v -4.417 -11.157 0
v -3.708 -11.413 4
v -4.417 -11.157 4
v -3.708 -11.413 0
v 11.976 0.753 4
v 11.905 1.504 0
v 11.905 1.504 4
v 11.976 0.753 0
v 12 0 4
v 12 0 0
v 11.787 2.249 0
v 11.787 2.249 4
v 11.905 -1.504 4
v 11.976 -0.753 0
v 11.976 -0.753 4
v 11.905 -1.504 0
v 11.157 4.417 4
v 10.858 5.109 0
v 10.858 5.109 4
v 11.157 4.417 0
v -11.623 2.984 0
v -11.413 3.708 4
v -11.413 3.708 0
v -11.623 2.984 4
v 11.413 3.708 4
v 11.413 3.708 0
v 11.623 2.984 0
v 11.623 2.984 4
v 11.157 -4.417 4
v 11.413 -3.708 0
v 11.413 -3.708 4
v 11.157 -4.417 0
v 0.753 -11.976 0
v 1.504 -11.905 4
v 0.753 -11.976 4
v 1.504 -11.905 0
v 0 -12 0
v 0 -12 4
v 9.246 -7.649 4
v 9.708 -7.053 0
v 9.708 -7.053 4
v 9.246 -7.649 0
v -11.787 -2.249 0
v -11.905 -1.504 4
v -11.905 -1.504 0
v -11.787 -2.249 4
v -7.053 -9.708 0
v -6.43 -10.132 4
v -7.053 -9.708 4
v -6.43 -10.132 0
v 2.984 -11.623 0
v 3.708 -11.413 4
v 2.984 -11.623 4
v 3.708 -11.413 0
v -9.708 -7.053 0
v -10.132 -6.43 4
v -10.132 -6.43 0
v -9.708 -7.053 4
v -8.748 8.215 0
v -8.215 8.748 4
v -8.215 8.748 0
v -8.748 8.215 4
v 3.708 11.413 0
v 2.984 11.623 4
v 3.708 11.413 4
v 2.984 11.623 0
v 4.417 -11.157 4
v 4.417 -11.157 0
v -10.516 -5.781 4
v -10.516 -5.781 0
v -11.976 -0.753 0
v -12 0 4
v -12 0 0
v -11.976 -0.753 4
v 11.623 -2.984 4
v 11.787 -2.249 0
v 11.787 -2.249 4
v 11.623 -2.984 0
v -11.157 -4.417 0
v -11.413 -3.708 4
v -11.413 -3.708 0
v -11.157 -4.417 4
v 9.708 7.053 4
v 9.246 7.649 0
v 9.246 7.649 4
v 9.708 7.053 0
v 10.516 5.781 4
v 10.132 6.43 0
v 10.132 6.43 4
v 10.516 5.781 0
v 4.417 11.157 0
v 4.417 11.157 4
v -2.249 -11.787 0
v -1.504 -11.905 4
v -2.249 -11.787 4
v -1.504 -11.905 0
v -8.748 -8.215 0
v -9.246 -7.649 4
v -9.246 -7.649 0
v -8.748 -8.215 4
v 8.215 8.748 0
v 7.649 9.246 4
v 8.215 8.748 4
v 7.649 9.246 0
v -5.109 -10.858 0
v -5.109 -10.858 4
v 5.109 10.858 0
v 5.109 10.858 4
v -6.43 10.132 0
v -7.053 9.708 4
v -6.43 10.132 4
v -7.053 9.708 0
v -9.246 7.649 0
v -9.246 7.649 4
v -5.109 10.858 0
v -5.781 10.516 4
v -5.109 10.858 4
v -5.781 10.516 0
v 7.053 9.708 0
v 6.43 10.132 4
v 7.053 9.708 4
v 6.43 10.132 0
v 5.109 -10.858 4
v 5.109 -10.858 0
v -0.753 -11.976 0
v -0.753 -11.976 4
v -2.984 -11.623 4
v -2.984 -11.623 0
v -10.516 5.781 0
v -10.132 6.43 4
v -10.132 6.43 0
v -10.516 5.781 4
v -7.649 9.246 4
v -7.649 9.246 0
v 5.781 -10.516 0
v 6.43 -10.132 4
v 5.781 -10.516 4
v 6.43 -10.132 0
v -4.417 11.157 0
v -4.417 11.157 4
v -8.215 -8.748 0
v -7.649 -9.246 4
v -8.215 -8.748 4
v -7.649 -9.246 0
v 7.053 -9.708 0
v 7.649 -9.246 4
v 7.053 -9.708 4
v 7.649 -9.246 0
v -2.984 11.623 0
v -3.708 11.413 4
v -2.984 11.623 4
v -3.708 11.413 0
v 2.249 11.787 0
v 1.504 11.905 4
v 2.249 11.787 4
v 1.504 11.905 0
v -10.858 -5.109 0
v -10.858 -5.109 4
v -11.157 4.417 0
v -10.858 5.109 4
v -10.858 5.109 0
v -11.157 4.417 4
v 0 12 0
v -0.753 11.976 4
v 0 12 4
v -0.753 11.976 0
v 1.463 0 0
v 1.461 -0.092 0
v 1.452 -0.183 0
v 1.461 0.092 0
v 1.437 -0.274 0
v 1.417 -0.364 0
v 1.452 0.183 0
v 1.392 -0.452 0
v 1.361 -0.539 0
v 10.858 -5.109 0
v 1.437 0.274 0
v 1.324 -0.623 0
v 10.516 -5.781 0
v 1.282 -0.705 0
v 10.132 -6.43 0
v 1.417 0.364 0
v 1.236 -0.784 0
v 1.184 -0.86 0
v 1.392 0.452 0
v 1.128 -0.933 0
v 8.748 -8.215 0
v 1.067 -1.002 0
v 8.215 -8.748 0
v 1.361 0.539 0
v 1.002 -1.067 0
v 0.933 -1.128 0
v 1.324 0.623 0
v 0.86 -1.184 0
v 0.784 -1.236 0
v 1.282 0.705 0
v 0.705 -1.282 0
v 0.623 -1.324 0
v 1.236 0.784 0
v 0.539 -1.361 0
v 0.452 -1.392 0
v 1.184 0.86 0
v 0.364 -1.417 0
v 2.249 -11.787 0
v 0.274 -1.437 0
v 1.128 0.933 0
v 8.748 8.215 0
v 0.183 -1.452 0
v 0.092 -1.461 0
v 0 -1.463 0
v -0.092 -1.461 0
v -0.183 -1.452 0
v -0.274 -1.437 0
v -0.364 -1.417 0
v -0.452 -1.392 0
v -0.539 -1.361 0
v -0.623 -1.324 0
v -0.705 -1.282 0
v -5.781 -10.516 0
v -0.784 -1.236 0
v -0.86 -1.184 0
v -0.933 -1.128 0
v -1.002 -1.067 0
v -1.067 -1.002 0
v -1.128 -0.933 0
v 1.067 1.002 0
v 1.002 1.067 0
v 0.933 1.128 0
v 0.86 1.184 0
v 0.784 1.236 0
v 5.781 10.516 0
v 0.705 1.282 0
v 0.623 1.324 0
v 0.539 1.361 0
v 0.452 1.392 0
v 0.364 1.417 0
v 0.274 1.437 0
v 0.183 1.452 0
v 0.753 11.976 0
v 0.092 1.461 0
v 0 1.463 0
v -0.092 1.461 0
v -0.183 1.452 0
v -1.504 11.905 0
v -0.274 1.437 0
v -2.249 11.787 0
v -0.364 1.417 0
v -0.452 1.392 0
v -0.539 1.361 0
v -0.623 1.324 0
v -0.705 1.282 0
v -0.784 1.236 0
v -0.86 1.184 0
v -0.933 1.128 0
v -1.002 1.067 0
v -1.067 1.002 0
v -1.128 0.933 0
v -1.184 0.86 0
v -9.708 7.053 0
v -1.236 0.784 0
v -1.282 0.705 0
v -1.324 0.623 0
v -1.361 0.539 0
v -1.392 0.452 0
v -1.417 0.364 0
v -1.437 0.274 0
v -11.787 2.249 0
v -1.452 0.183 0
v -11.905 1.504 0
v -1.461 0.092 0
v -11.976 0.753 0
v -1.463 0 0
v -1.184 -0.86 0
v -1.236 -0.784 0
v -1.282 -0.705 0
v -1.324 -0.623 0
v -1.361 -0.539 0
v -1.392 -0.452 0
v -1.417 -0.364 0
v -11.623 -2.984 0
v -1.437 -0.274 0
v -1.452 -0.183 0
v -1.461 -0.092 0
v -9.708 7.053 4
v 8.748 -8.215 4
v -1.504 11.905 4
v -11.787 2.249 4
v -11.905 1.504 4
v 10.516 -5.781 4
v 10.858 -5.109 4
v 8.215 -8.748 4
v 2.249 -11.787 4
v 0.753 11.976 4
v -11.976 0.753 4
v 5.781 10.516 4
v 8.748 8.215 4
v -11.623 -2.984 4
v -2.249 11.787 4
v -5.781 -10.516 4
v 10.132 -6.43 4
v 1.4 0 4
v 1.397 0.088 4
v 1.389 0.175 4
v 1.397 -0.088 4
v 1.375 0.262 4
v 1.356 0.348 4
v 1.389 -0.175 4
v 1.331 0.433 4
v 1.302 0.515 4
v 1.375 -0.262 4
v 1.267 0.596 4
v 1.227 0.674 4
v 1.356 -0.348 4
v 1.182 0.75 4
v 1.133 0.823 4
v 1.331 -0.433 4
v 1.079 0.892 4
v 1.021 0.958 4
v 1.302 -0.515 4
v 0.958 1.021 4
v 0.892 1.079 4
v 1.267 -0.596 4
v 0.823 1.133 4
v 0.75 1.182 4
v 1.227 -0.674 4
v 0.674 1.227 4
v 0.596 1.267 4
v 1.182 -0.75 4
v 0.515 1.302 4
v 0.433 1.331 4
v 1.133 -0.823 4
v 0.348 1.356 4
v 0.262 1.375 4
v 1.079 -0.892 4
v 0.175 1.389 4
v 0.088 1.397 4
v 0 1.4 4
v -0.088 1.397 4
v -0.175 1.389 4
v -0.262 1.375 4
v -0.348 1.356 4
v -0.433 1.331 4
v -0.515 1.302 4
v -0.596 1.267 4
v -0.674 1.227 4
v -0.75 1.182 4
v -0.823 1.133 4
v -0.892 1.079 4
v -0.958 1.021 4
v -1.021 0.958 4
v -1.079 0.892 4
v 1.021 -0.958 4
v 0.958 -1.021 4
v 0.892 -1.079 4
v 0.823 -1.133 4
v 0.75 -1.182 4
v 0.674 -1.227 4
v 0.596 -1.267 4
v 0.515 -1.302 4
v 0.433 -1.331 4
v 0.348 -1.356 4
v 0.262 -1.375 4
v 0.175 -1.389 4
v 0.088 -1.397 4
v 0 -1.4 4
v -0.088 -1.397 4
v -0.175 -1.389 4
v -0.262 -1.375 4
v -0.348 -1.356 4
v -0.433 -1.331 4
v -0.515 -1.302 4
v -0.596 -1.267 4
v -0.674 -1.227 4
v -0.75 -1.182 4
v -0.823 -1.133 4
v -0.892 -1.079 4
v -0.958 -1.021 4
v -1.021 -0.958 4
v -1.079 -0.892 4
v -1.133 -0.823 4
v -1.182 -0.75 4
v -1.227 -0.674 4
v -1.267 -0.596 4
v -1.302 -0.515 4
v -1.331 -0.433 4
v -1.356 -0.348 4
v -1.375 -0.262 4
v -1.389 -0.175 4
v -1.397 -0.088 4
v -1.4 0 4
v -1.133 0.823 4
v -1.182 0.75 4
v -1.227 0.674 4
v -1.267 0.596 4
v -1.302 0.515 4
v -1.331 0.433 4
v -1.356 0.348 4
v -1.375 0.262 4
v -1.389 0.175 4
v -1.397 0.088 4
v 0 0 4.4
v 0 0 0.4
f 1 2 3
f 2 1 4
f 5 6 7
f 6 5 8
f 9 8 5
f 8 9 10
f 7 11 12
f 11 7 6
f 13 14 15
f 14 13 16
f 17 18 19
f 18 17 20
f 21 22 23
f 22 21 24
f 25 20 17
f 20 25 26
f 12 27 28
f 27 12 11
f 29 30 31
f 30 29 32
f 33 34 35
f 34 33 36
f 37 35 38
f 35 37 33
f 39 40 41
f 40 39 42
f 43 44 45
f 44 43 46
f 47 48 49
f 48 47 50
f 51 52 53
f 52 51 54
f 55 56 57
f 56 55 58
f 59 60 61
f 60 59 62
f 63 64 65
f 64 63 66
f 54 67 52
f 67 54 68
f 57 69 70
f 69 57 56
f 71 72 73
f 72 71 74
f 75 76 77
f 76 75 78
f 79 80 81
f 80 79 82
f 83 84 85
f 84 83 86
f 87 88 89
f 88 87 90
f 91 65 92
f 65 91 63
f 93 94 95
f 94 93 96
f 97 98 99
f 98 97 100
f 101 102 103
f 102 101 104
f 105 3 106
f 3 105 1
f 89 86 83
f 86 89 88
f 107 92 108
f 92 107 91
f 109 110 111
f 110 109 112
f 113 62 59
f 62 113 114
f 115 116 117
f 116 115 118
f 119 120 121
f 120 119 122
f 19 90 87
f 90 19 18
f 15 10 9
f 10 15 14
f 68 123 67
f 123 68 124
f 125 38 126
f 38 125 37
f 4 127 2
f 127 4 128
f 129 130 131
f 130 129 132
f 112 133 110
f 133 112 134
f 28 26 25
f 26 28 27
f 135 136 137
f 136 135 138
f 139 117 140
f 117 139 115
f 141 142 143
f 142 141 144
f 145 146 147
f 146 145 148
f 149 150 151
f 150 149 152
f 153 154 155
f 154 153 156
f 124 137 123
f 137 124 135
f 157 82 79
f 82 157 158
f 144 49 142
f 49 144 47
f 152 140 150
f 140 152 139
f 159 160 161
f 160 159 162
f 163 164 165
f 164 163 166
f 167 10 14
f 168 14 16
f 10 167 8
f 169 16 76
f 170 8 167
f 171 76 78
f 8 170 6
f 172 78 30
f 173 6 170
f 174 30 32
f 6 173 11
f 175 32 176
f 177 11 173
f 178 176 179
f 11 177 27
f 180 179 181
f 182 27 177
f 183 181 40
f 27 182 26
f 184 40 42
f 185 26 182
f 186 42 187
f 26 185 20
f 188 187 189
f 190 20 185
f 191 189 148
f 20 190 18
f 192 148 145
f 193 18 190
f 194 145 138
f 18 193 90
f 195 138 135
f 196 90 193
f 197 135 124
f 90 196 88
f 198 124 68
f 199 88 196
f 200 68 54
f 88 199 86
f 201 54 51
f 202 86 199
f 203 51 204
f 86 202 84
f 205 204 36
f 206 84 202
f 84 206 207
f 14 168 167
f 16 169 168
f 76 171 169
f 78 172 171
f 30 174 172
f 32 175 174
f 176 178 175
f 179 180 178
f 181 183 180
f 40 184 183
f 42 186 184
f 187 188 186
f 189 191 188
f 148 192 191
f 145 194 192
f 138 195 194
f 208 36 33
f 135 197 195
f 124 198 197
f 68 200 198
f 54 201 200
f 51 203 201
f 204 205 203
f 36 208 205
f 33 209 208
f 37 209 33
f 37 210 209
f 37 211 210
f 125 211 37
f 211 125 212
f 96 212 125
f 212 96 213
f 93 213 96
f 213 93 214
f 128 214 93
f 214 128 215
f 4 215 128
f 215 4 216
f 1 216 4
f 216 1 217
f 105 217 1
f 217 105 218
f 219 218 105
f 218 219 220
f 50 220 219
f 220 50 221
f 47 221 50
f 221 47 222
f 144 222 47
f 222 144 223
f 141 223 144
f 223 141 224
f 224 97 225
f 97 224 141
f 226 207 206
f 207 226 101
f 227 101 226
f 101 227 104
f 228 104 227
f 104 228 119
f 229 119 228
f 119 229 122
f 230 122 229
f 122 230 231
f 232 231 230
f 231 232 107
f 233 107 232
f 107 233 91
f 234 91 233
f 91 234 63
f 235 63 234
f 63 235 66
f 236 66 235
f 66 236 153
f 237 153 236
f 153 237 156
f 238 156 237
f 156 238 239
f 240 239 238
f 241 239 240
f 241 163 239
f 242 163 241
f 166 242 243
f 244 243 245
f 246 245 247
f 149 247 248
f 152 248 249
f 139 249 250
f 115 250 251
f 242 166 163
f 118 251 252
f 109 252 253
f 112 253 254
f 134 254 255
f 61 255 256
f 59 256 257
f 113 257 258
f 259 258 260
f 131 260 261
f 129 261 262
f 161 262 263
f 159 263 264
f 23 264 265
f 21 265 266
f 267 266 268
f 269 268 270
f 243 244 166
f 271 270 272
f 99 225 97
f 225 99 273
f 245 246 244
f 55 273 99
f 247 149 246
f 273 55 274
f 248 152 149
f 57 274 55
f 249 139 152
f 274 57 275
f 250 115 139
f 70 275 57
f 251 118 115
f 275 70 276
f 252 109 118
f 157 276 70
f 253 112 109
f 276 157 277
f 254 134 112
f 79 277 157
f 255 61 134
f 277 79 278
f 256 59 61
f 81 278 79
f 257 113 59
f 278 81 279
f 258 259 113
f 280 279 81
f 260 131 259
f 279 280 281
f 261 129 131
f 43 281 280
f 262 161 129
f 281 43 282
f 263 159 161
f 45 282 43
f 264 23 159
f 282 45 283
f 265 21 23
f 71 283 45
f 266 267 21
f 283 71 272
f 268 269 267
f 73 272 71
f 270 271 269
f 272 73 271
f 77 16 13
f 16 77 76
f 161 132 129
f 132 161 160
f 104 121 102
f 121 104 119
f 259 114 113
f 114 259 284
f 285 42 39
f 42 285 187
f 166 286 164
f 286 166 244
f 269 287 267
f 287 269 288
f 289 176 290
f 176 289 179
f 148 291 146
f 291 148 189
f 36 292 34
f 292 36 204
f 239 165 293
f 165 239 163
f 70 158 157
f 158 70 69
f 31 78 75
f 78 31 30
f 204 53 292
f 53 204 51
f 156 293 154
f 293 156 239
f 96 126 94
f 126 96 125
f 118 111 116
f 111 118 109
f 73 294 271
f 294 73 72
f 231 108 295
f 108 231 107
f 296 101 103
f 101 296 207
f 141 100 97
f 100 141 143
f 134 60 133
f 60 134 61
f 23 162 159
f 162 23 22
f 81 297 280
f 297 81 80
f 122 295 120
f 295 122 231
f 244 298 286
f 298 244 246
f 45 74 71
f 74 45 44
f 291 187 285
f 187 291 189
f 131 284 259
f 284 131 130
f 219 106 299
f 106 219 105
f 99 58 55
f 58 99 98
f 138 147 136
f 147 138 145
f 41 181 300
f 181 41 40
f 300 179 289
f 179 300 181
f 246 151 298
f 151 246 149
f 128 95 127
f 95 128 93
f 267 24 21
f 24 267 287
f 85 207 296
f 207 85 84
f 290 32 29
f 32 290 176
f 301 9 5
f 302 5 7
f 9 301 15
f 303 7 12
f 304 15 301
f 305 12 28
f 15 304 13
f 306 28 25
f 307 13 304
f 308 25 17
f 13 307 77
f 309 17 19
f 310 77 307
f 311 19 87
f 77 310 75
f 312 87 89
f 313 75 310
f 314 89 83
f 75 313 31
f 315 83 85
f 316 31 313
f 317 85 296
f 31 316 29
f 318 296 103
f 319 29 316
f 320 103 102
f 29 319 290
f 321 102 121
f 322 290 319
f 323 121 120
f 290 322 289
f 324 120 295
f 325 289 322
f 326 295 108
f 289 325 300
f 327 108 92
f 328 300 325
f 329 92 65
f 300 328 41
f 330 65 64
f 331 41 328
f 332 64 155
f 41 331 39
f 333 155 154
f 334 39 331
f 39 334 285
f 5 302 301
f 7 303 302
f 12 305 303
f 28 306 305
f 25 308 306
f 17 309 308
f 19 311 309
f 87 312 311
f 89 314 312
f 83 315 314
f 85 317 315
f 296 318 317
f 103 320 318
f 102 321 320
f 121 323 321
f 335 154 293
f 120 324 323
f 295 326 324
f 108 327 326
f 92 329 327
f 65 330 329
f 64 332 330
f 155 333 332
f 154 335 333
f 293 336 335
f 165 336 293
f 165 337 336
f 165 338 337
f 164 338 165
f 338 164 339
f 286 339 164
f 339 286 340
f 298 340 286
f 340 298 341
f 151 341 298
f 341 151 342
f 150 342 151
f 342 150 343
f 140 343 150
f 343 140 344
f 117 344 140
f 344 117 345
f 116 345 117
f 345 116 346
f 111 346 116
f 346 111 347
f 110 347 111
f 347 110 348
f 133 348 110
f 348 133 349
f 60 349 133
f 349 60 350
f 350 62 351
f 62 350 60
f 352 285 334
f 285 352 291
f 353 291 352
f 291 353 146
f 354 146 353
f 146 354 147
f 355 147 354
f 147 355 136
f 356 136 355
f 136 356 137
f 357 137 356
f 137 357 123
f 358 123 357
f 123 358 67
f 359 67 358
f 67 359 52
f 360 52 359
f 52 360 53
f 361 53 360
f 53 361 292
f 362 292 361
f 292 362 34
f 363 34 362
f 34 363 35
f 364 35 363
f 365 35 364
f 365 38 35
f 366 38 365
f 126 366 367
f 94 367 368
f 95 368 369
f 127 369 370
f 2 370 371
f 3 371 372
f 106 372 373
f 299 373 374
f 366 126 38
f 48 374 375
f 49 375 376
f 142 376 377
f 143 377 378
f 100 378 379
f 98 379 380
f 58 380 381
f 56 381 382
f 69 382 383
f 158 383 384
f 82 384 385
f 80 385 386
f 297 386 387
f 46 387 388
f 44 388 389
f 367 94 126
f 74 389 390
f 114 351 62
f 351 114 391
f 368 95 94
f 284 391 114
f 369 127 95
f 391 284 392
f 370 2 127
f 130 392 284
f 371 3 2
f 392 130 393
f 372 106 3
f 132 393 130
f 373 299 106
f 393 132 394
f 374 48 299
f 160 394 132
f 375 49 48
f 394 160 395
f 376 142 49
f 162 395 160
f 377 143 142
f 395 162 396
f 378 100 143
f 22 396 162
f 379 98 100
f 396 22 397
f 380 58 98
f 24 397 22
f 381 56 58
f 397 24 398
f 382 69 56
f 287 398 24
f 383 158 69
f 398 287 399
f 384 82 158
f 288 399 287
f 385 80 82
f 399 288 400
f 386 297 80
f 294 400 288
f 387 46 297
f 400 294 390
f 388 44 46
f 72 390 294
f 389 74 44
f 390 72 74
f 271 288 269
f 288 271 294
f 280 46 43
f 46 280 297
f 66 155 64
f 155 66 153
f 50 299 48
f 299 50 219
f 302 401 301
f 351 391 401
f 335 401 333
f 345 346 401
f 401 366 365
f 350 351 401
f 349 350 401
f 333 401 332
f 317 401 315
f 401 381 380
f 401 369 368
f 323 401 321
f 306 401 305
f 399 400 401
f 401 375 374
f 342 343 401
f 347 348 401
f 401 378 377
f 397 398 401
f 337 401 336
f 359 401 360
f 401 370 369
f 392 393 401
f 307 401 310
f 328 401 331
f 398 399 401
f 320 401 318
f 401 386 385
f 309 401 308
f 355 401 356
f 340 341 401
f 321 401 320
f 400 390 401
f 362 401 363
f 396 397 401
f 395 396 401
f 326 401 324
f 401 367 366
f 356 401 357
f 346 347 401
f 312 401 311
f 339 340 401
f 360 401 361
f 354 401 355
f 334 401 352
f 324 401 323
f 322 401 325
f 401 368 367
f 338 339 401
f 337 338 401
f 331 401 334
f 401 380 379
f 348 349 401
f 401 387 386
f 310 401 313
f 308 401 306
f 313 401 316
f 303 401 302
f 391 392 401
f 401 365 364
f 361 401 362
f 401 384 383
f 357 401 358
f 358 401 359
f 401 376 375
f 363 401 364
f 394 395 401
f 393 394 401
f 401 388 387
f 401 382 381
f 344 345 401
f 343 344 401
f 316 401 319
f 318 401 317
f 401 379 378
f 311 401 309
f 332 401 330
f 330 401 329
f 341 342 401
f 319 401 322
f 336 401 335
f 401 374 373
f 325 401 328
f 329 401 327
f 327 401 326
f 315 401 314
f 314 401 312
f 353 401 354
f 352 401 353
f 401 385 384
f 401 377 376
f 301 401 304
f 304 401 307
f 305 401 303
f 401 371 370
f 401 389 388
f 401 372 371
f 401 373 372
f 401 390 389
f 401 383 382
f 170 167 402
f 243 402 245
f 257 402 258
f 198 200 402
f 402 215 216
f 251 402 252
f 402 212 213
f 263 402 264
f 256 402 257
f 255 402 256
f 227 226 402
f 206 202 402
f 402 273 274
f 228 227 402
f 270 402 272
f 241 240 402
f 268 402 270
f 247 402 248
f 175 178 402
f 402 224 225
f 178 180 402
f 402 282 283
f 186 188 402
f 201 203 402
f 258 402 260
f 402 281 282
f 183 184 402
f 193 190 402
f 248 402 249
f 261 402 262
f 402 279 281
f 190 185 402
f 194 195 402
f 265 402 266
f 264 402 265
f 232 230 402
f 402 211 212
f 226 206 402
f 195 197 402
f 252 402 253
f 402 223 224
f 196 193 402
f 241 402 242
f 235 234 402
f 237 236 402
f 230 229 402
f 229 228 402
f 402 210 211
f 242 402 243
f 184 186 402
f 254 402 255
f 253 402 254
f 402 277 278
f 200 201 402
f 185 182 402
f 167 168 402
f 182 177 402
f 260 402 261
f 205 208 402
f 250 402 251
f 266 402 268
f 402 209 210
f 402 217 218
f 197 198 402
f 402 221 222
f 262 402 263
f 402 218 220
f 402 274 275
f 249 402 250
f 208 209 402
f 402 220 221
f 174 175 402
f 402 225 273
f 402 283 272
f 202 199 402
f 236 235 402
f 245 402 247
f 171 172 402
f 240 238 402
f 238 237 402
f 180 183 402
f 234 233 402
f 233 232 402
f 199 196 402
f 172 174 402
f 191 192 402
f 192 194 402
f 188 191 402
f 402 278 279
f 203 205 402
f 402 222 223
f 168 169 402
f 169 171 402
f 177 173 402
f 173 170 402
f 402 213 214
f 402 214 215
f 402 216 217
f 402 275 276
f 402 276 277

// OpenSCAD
// Disc for Alon
// 10mm radius, 2mm height
// Stackable with a dent on bottom and bump on top

$fn = 100;

radius = 12;
height = 4;
stack_radius = 1.5;
stack_height = 0.4;

difference() {
    union() {
        // Main body
        cylinder(r = radius, h = height);
        
        // Top bump (conical)
        translate([0, 0, height])
            cylinder(r1 = stack_radius - 0.1, r2 = 0, h = stack_height); // Slightly smaller for clearance
    }
    
    // Bottom dent (conical)
    translate([0, 0, -0.01])
        cylinder(r1 = stack_radius, r2 = 0, h = stack_height + 0.01);
}
